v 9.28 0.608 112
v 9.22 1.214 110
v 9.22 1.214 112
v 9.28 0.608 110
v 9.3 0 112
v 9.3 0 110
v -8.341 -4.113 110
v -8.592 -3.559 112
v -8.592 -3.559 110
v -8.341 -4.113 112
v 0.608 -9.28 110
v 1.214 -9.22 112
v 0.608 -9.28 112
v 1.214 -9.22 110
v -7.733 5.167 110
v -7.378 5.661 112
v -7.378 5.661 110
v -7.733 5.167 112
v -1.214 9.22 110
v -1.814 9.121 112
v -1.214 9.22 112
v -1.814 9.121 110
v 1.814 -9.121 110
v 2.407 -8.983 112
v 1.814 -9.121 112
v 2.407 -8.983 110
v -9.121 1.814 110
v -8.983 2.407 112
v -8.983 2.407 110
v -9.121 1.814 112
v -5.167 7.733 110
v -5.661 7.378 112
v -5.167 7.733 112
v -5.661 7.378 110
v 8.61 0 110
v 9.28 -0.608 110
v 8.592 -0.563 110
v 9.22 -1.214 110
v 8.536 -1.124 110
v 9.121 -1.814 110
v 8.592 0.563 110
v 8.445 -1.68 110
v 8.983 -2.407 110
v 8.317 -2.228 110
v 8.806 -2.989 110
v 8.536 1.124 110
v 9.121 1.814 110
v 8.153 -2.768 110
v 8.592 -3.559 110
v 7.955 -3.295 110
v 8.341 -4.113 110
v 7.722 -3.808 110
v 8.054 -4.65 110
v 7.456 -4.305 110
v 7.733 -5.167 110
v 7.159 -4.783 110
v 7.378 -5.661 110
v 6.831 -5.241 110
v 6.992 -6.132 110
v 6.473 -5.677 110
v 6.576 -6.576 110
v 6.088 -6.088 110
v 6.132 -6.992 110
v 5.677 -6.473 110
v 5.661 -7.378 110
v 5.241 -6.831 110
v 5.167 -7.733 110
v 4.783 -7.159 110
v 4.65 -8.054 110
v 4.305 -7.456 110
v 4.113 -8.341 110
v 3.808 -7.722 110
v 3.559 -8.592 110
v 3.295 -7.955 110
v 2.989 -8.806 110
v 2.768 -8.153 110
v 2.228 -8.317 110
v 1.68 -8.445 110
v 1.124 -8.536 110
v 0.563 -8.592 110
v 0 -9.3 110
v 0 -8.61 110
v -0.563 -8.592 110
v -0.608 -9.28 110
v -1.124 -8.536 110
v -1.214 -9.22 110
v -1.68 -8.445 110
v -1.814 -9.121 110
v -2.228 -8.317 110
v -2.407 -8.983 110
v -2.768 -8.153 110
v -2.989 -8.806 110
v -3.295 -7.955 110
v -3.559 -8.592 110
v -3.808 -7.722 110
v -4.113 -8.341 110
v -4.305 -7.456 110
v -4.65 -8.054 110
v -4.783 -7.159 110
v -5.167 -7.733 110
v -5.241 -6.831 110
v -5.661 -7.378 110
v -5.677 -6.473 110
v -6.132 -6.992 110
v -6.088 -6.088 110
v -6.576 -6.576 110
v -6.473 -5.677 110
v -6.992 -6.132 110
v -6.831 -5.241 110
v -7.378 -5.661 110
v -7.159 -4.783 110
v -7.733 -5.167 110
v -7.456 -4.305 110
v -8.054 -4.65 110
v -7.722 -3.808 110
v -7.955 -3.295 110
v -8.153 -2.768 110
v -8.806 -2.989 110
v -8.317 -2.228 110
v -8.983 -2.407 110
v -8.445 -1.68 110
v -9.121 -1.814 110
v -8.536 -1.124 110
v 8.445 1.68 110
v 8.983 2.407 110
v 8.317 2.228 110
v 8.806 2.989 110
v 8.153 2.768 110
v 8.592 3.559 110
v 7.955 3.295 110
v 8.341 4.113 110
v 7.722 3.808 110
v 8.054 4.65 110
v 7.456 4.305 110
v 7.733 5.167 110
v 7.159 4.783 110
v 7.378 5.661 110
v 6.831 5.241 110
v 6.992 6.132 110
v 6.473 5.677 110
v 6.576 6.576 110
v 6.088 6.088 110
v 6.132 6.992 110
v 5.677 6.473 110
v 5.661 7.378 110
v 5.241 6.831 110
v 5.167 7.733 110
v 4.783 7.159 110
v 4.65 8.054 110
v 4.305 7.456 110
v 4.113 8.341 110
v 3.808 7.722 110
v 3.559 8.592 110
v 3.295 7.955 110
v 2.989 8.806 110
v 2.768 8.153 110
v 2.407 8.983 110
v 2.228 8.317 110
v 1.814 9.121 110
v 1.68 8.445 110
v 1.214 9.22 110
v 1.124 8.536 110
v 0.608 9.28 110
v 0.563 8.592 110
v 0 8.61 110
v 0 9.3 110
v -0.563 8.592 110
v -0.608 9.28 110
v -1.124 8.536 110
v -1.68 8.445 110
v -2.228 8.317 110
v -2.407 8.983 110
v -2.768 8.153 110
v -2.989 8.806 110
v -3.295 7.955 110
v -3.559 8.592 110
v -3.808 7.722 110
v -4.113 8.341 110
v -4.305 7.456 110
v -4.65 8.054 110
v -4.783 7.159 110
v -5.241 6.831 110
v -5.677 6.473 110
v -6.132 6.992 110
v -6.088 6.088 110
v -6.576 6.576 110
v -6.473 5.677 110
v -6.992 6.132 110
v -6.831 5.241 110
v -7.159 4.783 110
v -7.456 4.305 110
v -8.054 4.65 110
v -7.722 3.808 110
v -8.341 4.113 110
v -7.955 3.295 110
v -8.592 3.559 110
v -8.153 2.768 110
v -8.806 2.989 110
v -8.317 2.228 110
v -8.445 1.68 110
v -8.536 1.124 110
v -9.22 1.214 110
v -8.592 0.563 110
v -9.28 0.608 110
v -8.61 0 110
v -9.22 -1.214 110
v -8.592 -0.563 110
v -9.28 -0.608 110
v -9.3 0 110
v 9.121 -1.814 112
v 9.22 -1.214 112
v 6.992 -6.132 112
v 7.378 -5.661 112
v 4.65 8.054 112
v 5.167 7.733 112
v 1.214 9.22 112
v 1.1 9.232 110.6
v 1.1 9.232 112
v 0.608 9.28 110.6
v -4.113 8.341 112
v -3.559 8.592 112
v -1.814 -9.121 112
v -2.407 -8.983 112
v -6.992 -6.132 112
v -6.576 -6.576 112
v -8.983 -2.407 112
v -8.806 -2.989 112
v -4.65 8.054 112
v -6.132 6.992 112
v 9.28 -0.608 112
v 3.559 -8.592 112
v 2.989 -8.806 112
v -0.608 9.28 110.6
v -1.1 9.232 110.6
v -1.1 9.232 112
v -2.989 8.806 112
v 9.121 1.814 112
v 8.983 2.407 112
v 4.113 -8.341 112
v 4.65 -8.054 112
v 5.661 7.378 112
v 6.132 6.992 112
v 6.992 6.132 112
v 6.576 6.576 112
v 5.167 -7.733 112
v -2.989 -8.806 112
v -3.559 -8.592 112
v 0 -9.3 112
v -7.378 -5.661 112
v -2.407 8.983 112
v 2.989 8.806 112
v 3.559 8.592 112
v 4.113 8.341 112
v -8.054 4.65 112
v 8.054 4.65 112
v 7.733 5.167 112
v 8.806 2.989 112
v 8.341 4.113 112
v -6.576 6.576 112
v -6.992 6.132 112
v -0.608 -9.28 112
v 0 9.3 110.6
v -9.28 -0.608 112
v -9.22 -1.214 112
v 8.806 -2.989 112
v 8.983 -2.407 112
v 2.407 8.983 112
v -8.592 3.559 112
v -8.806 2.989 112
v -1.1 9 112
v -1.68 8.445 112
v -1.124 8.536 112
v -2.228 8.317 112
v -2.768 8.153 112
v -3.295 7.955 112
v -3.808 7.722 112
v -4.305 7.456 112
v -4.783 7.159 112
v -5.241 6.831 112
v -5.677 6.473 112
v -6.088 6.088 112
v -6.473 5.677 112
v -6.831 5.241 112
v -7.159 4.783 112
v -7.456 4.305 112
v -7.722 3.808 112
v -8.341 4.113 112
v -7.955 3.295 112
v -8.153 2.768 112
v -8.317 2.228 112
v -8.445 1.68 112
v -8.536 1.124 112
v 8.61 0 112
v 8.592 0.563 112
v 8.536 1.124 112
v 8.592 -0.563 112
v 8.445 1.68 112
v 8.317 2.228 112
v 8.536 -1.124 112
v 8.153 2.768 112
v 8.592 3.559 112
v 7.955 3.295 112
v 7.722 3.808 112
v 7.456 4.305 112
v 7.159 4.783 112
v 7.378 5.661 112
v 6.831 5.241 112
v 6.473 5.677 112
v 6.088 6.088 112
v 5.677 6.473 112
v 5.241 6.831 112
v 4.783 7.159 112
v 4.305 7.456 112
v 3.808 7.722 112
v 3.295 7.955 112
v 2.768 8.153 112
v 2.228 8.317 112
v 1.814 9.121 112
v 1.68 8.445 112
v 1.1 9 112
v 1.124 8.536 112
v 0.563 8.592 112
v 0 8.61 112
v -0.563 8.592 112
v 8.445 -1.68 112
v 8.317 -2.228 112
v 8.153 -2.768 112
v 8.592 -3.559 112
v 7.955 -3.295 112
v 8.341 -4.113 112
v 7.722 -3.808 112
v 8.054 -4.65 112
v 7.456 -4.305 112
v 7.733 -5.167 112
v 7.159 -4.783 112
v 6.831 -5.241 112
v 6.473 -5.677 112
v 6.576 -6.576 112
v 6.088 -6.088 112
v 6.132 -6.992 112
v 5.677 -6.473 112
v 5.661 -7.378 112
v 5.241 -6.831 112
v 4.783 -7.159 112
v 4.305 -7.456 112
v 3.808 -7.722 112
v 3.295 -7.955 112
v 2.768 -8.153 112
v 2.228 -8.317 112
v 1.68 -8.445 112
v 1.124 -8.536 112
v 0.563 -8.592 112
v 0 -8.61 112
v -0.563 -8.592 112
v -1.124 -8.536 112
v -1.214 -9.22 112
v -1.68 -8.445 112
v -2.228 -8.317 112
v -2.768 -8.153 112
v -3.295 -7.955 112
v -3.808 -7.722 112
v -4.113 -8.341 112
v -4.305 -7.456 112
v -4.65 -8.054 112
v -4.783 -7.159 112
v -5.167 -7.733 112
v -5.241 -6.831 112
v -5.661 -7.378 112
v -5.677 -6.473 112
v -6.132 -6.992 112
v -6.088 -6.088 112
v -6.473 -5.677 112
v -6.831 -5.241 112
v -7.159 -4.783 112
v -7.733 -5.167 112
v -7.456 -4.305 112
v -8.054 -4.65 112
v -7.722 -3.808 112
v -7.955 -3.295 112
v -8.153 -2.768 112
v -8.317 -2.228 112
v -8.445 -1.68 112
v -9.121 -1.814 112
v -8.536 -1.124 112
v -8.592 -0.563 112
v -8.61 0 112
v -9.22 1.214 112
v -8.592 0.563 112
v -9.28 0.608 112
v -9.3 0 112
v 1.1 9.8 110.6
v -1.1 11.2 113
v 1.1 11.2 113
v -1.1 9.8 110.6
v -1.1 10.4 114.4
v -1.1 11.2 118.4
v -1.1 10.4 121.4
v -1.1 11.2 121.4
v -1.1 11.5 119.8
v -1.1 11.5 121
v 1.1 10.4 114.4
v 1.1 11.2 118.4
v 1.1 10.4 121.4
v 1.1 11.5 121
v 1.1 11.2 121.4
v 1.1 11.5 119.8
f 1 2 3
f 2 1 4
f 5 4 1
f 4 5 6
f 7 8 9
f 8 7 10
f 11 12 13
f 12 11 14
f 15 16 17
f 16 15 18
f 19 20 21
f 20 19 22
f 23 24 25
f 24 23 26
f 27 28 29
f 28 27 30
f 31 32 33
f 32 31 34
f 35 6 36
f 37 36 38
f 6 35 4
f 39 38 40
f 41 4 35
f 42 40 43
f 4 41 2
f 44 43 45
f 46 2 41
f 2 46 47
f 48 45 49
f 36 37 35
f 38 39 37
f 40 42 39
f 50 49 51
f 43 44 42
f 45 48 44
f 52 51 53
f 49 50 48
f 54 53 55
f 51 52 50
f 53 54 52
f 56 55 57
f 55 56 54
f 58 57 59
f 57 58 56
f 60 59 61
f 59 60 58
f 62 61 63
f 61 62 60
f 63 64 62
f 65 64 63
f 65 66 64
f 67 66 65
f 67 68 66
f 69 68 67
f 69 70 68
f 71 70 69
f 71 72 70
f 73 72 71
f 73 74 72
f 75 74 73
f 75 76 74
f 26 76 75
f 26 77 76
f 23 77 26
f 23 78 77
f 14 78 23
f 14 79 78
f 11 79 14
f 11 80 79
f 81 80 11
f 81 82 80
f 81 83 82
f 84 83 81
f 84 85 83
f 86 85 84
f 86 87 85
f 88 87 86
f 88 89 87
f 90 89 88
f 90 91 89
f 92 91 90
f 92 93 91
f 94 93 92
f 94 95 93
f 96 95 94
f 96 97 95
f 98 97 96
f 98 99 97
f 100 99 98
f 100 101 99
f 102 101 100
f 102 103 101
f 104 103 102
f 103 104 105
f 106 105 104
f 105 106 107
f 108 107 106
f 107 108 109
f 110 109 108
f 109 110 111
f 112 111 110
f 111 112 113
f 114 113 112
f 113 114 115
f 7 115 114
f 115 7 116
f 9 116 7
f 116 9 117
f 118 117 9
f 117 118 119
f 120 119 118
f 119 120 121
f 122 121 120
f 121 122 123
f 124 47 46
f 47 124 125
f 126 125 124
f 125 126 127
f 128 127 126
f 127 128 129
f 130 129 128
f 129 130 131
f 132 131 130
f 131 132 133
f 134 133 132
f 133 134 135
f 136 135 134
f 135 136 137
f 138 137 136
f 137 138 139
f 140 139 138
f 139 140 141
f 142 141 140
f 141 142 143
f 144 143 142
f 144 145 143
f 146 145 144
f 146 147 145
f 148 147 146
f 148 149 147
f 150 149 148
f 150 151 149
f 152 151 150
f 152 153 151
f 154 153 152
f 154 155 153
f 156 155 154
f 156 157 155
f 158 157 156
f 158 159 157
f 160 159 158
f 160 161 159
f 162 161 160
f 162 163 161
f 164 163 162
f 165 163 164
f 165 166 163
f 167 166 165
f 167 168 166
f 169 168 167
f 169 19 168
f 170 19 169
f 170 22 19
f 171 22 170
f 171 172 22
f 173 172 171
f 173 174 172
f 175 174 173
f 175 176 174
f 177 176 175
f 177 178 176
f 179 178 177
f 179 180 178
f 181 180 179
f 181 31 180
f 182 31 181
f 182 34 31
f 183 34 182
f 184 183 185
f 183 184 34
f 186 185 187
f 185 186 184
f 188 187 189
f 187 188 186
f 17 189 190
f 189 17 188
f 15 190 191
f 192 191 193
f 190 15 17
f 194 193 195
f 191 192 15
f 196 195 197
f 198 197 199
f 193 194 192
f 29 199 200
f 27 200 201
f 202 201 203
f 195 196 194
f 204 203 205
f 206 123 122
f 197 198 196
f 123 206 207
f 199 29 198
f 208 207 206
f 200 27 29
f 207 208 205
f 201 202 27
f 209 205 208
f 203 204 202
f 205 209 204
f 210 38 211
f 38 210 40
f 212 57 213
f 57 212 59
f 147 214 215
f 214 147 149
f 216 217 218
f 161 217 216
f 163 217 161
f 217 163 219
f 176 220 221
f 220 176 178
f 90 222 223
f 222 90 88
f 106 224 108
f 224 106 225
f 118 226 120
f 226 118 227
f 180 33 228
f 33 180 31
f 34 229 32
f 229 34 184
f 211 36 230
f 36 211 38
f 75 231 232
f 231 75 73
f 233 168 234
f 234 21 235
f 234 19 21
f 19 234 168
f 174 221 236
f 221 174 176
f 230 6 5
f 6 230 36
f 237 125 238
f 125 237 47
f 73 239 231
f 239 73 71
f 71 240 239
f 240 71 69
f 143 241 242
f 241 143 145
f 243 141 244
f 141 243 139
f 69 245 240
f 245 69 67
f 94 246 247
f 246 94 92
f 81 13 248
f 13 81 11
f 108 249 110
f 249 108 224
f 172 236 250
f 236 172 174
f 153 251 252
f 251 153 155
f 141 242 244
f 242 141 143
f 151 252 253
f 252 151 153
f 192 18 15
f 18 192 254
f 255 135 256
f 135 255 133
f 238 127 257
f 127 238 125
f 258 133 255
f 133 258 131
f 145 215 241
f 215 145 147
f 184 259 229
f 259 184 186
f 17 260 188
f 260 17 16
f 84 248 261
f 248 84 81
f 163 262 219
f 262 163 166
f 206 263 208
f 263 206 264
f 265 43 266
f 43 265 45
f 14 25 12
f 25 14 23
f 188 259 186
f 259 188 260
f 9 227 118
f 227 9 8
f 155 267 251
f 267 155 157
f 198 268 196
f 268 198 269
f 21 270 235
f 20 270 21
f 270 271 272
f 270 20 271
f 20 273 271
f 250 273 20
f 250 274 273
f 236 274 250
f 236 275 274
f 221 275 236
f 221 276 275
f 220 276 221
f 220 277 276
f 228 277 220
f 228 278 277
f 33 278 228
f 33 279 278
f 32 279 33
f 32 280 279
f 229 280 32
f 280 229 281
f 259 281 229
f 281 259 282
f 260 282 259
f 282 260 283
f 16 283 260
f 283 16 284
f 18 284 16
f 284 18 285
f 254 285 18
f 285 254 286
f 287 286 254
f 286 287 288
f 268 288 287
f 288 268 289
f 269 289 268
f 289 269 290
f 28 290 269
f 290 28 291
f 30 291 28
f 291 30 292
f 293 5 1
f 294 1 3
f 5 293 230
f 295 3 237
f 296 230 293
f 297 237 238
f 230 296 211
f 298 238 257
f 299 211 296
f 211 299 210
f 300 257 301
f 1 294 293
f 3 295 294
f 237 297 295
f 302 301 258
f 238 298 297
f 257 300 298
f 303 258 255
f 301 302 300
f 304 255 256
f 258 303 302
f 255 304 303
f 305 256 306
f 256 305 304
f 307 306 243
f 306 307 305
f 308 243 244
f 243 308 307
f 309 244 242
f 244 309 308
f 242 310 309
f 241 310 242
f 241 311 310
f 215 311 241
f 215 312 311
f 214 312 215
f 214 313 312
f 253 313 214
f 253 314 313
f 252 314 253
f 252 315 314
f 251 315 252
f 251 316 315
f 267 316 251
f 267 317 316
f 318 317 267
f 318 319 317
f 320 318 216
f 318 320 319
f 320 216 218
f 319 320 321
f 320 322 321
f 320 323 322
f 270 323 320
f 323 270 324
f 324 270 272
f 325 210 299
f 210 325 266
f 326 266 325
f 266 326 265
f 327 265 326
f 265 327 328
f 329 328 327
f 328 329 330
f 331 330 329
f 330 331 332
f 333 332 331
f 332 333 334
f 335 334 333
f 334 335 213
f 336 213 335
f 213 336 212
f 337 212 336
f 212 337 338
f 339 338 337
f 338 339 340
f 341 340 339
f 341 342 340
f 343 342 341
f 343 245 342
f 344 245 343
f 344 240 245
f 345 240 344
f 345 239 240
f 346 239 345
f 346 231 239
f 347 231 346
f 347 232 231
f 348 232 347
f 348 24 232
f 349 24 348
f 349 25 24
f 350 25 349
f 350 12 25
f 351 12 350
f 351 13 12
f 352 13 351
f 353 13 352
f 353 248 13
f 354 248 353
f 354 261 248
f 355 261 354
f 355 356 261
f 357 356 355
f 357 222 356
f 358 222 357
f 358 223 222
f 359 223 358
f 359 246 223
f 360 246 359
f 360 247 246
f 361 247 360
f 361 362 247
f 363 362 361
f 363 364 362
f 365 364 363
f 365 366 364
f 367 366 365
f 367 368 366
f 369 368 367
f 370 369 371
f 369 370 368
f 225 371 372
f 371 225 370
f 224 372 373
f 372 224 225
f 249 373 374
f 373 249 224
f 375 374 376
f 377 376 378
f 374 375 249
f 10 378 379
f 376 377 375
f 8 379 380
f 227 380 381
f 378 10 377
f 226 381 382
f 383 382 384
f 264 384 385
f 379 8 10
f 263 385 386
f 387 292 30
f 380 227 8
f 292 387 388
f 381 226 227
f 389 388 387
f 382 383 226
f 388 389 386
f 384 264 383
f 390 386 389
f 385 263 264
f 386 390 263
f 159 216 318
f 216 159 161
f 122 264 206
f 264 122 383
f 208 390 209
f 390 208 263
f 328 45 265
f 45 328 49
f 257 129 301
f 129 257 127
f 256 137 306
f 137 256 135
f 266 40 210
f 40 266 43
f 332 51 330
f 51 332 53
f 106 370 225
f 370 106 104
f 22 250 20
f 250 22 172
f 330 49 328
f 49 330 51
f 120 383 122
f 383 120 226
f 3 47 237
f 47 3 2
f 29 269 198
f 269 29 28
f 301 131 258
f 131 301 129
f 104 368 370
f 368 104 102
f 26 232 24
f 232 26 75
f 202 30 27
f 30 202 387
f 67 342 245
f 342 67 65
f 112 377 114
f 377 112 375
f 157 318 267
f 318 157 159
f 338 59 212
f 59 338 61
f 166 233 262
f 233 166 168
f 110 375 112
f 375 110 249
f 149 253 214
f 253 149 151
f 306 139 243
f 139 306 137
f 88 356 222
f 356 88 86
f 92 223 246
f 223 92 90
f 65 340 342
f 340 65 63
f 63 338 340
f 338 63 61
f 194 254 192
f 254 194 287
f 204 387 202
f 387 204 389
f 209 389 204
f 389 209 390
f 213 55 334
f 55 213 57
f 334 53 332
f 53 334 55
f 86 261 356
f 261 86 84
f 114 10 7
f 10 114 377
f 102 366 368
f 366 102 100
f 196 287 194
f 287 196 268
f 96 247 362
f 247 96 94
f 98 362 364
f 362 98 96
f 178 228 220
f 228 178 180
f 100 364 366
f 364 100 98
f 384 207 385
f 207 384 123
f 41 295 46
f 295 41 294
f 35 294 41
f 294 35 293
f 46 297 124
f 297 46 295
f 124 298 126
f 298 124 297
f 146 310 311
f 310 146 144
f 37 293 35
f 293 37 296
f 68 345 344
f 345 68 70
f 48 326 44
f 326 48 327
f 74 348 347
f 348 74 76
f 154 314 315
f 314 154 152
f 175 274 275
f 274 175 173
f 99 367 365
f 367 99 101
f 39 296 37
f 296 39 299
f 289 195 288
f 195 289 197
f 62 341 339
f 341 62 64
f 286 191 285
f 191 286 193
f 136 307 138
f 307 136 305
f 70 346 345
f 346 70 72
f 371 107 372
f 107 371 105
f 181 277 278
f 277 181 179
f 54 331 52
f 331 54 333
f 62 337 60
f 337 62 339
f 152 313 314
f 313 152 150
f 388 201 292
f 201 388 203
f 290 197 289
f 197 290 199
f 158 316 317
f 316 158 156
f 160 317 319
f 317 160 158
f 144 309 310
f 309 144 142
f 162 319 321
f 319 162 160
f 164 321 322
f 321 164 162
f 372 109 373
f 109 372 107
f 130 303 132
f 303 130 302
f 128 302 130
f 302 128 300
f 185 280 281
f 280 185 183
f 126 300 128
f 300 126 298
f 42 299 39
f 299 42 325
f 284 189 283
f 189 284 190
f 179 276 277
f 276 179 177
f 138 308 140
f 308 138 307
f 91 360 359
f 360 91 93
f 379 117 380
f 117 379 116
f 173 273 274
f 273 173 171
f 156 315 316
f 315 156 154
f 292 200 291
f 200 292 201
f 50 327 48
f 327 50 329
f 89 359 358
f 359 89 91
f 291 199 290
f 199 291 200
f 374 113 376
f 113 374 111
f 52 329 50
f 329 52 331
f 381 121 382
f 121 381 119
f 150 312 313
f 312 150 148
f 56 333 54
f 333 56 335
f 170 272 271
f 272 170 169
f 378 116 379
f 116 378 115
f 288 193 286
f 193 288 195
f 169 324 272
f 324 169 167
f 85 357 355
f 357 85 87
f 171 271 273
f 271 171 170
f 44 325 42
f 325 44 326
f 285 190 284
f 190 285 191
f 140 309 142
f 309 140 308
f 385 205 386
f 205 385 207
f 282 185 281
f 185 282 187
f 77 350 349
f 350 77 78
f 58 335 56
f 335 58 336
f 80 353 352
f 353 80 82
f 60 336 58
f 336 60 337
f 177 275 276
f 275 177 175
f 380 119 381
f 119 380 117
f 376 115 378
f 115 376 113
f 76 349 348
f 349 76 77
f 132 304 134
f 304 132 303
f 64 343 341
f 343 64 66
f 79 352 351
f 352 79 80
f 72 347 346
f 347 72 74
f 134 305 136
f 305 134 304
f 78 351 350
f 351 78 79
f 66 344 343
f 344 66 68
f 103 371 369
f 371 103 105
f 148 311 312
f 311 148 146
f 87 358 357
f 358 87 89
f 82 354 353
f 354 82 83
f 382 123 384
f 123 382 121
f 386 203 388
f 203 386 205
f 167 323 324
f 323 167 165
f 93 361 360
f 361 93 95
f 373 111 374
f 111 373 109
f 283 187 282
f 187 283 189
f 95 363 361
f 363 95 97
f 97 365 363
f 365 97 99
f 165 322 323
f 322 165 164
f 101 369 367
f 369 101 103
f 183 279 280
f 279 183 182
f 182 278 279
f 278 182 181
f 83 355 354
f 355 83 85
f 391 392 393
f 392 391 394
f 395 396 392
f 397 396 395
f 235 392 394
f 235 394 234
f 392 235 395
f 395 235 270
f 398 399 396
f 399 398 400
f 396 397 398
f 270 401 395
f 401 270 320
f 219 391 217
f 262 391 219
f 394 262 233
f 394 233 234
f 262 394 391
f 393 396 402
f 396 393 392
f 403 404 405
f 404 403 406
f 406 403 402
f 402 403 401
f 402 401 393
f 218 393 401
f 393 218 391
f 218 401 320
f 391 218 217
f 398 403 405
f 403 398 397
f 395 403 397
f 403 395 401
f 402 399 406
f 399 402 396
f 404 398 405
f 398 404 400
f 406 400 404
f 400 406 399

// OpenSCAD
$fn = 96;
// Pocket clip v3: lower C-collar at z=110..112, strip rises to z=120,
// standing clear of the detent boss (boss y=10.0, z=117..121).
difference() {
    union() {
        translate([0,0,110.0]) difference() {
            cylinder(h=2.0, r=9.30, center=false);
            translate([0,0,-0.1]) cylinder(h=2.2, r=8.61, center=false);
            translate([-6,-12,109.0]) cube([12,6,4], center=false);
        }
        hull() {
            translate([-1.1, 9.0, 110.6]) cube([2.2,0.8,1.4], center=false);
            translate([-1.1, 10.4, 113.0]) cube([2.2,0.8,1.4], center=false);
        }
        hull() {
            translate([-1.1, 10.4, 113.0]) cube([2.2,0.8,1.4], center=false);
            translate([-1.1, 10.4, 118.4]) cube([2.2,0.8,3.0], center=false);
        }
        hull() {
            translate([-1.1, 10.4, 118.4]) cube([2.2,0.8,3.0], center=false);
            translate([-1.1, 10.5, 119.8]) cube([2.2,1.0,1.2], center=false);
        }
    }
}
